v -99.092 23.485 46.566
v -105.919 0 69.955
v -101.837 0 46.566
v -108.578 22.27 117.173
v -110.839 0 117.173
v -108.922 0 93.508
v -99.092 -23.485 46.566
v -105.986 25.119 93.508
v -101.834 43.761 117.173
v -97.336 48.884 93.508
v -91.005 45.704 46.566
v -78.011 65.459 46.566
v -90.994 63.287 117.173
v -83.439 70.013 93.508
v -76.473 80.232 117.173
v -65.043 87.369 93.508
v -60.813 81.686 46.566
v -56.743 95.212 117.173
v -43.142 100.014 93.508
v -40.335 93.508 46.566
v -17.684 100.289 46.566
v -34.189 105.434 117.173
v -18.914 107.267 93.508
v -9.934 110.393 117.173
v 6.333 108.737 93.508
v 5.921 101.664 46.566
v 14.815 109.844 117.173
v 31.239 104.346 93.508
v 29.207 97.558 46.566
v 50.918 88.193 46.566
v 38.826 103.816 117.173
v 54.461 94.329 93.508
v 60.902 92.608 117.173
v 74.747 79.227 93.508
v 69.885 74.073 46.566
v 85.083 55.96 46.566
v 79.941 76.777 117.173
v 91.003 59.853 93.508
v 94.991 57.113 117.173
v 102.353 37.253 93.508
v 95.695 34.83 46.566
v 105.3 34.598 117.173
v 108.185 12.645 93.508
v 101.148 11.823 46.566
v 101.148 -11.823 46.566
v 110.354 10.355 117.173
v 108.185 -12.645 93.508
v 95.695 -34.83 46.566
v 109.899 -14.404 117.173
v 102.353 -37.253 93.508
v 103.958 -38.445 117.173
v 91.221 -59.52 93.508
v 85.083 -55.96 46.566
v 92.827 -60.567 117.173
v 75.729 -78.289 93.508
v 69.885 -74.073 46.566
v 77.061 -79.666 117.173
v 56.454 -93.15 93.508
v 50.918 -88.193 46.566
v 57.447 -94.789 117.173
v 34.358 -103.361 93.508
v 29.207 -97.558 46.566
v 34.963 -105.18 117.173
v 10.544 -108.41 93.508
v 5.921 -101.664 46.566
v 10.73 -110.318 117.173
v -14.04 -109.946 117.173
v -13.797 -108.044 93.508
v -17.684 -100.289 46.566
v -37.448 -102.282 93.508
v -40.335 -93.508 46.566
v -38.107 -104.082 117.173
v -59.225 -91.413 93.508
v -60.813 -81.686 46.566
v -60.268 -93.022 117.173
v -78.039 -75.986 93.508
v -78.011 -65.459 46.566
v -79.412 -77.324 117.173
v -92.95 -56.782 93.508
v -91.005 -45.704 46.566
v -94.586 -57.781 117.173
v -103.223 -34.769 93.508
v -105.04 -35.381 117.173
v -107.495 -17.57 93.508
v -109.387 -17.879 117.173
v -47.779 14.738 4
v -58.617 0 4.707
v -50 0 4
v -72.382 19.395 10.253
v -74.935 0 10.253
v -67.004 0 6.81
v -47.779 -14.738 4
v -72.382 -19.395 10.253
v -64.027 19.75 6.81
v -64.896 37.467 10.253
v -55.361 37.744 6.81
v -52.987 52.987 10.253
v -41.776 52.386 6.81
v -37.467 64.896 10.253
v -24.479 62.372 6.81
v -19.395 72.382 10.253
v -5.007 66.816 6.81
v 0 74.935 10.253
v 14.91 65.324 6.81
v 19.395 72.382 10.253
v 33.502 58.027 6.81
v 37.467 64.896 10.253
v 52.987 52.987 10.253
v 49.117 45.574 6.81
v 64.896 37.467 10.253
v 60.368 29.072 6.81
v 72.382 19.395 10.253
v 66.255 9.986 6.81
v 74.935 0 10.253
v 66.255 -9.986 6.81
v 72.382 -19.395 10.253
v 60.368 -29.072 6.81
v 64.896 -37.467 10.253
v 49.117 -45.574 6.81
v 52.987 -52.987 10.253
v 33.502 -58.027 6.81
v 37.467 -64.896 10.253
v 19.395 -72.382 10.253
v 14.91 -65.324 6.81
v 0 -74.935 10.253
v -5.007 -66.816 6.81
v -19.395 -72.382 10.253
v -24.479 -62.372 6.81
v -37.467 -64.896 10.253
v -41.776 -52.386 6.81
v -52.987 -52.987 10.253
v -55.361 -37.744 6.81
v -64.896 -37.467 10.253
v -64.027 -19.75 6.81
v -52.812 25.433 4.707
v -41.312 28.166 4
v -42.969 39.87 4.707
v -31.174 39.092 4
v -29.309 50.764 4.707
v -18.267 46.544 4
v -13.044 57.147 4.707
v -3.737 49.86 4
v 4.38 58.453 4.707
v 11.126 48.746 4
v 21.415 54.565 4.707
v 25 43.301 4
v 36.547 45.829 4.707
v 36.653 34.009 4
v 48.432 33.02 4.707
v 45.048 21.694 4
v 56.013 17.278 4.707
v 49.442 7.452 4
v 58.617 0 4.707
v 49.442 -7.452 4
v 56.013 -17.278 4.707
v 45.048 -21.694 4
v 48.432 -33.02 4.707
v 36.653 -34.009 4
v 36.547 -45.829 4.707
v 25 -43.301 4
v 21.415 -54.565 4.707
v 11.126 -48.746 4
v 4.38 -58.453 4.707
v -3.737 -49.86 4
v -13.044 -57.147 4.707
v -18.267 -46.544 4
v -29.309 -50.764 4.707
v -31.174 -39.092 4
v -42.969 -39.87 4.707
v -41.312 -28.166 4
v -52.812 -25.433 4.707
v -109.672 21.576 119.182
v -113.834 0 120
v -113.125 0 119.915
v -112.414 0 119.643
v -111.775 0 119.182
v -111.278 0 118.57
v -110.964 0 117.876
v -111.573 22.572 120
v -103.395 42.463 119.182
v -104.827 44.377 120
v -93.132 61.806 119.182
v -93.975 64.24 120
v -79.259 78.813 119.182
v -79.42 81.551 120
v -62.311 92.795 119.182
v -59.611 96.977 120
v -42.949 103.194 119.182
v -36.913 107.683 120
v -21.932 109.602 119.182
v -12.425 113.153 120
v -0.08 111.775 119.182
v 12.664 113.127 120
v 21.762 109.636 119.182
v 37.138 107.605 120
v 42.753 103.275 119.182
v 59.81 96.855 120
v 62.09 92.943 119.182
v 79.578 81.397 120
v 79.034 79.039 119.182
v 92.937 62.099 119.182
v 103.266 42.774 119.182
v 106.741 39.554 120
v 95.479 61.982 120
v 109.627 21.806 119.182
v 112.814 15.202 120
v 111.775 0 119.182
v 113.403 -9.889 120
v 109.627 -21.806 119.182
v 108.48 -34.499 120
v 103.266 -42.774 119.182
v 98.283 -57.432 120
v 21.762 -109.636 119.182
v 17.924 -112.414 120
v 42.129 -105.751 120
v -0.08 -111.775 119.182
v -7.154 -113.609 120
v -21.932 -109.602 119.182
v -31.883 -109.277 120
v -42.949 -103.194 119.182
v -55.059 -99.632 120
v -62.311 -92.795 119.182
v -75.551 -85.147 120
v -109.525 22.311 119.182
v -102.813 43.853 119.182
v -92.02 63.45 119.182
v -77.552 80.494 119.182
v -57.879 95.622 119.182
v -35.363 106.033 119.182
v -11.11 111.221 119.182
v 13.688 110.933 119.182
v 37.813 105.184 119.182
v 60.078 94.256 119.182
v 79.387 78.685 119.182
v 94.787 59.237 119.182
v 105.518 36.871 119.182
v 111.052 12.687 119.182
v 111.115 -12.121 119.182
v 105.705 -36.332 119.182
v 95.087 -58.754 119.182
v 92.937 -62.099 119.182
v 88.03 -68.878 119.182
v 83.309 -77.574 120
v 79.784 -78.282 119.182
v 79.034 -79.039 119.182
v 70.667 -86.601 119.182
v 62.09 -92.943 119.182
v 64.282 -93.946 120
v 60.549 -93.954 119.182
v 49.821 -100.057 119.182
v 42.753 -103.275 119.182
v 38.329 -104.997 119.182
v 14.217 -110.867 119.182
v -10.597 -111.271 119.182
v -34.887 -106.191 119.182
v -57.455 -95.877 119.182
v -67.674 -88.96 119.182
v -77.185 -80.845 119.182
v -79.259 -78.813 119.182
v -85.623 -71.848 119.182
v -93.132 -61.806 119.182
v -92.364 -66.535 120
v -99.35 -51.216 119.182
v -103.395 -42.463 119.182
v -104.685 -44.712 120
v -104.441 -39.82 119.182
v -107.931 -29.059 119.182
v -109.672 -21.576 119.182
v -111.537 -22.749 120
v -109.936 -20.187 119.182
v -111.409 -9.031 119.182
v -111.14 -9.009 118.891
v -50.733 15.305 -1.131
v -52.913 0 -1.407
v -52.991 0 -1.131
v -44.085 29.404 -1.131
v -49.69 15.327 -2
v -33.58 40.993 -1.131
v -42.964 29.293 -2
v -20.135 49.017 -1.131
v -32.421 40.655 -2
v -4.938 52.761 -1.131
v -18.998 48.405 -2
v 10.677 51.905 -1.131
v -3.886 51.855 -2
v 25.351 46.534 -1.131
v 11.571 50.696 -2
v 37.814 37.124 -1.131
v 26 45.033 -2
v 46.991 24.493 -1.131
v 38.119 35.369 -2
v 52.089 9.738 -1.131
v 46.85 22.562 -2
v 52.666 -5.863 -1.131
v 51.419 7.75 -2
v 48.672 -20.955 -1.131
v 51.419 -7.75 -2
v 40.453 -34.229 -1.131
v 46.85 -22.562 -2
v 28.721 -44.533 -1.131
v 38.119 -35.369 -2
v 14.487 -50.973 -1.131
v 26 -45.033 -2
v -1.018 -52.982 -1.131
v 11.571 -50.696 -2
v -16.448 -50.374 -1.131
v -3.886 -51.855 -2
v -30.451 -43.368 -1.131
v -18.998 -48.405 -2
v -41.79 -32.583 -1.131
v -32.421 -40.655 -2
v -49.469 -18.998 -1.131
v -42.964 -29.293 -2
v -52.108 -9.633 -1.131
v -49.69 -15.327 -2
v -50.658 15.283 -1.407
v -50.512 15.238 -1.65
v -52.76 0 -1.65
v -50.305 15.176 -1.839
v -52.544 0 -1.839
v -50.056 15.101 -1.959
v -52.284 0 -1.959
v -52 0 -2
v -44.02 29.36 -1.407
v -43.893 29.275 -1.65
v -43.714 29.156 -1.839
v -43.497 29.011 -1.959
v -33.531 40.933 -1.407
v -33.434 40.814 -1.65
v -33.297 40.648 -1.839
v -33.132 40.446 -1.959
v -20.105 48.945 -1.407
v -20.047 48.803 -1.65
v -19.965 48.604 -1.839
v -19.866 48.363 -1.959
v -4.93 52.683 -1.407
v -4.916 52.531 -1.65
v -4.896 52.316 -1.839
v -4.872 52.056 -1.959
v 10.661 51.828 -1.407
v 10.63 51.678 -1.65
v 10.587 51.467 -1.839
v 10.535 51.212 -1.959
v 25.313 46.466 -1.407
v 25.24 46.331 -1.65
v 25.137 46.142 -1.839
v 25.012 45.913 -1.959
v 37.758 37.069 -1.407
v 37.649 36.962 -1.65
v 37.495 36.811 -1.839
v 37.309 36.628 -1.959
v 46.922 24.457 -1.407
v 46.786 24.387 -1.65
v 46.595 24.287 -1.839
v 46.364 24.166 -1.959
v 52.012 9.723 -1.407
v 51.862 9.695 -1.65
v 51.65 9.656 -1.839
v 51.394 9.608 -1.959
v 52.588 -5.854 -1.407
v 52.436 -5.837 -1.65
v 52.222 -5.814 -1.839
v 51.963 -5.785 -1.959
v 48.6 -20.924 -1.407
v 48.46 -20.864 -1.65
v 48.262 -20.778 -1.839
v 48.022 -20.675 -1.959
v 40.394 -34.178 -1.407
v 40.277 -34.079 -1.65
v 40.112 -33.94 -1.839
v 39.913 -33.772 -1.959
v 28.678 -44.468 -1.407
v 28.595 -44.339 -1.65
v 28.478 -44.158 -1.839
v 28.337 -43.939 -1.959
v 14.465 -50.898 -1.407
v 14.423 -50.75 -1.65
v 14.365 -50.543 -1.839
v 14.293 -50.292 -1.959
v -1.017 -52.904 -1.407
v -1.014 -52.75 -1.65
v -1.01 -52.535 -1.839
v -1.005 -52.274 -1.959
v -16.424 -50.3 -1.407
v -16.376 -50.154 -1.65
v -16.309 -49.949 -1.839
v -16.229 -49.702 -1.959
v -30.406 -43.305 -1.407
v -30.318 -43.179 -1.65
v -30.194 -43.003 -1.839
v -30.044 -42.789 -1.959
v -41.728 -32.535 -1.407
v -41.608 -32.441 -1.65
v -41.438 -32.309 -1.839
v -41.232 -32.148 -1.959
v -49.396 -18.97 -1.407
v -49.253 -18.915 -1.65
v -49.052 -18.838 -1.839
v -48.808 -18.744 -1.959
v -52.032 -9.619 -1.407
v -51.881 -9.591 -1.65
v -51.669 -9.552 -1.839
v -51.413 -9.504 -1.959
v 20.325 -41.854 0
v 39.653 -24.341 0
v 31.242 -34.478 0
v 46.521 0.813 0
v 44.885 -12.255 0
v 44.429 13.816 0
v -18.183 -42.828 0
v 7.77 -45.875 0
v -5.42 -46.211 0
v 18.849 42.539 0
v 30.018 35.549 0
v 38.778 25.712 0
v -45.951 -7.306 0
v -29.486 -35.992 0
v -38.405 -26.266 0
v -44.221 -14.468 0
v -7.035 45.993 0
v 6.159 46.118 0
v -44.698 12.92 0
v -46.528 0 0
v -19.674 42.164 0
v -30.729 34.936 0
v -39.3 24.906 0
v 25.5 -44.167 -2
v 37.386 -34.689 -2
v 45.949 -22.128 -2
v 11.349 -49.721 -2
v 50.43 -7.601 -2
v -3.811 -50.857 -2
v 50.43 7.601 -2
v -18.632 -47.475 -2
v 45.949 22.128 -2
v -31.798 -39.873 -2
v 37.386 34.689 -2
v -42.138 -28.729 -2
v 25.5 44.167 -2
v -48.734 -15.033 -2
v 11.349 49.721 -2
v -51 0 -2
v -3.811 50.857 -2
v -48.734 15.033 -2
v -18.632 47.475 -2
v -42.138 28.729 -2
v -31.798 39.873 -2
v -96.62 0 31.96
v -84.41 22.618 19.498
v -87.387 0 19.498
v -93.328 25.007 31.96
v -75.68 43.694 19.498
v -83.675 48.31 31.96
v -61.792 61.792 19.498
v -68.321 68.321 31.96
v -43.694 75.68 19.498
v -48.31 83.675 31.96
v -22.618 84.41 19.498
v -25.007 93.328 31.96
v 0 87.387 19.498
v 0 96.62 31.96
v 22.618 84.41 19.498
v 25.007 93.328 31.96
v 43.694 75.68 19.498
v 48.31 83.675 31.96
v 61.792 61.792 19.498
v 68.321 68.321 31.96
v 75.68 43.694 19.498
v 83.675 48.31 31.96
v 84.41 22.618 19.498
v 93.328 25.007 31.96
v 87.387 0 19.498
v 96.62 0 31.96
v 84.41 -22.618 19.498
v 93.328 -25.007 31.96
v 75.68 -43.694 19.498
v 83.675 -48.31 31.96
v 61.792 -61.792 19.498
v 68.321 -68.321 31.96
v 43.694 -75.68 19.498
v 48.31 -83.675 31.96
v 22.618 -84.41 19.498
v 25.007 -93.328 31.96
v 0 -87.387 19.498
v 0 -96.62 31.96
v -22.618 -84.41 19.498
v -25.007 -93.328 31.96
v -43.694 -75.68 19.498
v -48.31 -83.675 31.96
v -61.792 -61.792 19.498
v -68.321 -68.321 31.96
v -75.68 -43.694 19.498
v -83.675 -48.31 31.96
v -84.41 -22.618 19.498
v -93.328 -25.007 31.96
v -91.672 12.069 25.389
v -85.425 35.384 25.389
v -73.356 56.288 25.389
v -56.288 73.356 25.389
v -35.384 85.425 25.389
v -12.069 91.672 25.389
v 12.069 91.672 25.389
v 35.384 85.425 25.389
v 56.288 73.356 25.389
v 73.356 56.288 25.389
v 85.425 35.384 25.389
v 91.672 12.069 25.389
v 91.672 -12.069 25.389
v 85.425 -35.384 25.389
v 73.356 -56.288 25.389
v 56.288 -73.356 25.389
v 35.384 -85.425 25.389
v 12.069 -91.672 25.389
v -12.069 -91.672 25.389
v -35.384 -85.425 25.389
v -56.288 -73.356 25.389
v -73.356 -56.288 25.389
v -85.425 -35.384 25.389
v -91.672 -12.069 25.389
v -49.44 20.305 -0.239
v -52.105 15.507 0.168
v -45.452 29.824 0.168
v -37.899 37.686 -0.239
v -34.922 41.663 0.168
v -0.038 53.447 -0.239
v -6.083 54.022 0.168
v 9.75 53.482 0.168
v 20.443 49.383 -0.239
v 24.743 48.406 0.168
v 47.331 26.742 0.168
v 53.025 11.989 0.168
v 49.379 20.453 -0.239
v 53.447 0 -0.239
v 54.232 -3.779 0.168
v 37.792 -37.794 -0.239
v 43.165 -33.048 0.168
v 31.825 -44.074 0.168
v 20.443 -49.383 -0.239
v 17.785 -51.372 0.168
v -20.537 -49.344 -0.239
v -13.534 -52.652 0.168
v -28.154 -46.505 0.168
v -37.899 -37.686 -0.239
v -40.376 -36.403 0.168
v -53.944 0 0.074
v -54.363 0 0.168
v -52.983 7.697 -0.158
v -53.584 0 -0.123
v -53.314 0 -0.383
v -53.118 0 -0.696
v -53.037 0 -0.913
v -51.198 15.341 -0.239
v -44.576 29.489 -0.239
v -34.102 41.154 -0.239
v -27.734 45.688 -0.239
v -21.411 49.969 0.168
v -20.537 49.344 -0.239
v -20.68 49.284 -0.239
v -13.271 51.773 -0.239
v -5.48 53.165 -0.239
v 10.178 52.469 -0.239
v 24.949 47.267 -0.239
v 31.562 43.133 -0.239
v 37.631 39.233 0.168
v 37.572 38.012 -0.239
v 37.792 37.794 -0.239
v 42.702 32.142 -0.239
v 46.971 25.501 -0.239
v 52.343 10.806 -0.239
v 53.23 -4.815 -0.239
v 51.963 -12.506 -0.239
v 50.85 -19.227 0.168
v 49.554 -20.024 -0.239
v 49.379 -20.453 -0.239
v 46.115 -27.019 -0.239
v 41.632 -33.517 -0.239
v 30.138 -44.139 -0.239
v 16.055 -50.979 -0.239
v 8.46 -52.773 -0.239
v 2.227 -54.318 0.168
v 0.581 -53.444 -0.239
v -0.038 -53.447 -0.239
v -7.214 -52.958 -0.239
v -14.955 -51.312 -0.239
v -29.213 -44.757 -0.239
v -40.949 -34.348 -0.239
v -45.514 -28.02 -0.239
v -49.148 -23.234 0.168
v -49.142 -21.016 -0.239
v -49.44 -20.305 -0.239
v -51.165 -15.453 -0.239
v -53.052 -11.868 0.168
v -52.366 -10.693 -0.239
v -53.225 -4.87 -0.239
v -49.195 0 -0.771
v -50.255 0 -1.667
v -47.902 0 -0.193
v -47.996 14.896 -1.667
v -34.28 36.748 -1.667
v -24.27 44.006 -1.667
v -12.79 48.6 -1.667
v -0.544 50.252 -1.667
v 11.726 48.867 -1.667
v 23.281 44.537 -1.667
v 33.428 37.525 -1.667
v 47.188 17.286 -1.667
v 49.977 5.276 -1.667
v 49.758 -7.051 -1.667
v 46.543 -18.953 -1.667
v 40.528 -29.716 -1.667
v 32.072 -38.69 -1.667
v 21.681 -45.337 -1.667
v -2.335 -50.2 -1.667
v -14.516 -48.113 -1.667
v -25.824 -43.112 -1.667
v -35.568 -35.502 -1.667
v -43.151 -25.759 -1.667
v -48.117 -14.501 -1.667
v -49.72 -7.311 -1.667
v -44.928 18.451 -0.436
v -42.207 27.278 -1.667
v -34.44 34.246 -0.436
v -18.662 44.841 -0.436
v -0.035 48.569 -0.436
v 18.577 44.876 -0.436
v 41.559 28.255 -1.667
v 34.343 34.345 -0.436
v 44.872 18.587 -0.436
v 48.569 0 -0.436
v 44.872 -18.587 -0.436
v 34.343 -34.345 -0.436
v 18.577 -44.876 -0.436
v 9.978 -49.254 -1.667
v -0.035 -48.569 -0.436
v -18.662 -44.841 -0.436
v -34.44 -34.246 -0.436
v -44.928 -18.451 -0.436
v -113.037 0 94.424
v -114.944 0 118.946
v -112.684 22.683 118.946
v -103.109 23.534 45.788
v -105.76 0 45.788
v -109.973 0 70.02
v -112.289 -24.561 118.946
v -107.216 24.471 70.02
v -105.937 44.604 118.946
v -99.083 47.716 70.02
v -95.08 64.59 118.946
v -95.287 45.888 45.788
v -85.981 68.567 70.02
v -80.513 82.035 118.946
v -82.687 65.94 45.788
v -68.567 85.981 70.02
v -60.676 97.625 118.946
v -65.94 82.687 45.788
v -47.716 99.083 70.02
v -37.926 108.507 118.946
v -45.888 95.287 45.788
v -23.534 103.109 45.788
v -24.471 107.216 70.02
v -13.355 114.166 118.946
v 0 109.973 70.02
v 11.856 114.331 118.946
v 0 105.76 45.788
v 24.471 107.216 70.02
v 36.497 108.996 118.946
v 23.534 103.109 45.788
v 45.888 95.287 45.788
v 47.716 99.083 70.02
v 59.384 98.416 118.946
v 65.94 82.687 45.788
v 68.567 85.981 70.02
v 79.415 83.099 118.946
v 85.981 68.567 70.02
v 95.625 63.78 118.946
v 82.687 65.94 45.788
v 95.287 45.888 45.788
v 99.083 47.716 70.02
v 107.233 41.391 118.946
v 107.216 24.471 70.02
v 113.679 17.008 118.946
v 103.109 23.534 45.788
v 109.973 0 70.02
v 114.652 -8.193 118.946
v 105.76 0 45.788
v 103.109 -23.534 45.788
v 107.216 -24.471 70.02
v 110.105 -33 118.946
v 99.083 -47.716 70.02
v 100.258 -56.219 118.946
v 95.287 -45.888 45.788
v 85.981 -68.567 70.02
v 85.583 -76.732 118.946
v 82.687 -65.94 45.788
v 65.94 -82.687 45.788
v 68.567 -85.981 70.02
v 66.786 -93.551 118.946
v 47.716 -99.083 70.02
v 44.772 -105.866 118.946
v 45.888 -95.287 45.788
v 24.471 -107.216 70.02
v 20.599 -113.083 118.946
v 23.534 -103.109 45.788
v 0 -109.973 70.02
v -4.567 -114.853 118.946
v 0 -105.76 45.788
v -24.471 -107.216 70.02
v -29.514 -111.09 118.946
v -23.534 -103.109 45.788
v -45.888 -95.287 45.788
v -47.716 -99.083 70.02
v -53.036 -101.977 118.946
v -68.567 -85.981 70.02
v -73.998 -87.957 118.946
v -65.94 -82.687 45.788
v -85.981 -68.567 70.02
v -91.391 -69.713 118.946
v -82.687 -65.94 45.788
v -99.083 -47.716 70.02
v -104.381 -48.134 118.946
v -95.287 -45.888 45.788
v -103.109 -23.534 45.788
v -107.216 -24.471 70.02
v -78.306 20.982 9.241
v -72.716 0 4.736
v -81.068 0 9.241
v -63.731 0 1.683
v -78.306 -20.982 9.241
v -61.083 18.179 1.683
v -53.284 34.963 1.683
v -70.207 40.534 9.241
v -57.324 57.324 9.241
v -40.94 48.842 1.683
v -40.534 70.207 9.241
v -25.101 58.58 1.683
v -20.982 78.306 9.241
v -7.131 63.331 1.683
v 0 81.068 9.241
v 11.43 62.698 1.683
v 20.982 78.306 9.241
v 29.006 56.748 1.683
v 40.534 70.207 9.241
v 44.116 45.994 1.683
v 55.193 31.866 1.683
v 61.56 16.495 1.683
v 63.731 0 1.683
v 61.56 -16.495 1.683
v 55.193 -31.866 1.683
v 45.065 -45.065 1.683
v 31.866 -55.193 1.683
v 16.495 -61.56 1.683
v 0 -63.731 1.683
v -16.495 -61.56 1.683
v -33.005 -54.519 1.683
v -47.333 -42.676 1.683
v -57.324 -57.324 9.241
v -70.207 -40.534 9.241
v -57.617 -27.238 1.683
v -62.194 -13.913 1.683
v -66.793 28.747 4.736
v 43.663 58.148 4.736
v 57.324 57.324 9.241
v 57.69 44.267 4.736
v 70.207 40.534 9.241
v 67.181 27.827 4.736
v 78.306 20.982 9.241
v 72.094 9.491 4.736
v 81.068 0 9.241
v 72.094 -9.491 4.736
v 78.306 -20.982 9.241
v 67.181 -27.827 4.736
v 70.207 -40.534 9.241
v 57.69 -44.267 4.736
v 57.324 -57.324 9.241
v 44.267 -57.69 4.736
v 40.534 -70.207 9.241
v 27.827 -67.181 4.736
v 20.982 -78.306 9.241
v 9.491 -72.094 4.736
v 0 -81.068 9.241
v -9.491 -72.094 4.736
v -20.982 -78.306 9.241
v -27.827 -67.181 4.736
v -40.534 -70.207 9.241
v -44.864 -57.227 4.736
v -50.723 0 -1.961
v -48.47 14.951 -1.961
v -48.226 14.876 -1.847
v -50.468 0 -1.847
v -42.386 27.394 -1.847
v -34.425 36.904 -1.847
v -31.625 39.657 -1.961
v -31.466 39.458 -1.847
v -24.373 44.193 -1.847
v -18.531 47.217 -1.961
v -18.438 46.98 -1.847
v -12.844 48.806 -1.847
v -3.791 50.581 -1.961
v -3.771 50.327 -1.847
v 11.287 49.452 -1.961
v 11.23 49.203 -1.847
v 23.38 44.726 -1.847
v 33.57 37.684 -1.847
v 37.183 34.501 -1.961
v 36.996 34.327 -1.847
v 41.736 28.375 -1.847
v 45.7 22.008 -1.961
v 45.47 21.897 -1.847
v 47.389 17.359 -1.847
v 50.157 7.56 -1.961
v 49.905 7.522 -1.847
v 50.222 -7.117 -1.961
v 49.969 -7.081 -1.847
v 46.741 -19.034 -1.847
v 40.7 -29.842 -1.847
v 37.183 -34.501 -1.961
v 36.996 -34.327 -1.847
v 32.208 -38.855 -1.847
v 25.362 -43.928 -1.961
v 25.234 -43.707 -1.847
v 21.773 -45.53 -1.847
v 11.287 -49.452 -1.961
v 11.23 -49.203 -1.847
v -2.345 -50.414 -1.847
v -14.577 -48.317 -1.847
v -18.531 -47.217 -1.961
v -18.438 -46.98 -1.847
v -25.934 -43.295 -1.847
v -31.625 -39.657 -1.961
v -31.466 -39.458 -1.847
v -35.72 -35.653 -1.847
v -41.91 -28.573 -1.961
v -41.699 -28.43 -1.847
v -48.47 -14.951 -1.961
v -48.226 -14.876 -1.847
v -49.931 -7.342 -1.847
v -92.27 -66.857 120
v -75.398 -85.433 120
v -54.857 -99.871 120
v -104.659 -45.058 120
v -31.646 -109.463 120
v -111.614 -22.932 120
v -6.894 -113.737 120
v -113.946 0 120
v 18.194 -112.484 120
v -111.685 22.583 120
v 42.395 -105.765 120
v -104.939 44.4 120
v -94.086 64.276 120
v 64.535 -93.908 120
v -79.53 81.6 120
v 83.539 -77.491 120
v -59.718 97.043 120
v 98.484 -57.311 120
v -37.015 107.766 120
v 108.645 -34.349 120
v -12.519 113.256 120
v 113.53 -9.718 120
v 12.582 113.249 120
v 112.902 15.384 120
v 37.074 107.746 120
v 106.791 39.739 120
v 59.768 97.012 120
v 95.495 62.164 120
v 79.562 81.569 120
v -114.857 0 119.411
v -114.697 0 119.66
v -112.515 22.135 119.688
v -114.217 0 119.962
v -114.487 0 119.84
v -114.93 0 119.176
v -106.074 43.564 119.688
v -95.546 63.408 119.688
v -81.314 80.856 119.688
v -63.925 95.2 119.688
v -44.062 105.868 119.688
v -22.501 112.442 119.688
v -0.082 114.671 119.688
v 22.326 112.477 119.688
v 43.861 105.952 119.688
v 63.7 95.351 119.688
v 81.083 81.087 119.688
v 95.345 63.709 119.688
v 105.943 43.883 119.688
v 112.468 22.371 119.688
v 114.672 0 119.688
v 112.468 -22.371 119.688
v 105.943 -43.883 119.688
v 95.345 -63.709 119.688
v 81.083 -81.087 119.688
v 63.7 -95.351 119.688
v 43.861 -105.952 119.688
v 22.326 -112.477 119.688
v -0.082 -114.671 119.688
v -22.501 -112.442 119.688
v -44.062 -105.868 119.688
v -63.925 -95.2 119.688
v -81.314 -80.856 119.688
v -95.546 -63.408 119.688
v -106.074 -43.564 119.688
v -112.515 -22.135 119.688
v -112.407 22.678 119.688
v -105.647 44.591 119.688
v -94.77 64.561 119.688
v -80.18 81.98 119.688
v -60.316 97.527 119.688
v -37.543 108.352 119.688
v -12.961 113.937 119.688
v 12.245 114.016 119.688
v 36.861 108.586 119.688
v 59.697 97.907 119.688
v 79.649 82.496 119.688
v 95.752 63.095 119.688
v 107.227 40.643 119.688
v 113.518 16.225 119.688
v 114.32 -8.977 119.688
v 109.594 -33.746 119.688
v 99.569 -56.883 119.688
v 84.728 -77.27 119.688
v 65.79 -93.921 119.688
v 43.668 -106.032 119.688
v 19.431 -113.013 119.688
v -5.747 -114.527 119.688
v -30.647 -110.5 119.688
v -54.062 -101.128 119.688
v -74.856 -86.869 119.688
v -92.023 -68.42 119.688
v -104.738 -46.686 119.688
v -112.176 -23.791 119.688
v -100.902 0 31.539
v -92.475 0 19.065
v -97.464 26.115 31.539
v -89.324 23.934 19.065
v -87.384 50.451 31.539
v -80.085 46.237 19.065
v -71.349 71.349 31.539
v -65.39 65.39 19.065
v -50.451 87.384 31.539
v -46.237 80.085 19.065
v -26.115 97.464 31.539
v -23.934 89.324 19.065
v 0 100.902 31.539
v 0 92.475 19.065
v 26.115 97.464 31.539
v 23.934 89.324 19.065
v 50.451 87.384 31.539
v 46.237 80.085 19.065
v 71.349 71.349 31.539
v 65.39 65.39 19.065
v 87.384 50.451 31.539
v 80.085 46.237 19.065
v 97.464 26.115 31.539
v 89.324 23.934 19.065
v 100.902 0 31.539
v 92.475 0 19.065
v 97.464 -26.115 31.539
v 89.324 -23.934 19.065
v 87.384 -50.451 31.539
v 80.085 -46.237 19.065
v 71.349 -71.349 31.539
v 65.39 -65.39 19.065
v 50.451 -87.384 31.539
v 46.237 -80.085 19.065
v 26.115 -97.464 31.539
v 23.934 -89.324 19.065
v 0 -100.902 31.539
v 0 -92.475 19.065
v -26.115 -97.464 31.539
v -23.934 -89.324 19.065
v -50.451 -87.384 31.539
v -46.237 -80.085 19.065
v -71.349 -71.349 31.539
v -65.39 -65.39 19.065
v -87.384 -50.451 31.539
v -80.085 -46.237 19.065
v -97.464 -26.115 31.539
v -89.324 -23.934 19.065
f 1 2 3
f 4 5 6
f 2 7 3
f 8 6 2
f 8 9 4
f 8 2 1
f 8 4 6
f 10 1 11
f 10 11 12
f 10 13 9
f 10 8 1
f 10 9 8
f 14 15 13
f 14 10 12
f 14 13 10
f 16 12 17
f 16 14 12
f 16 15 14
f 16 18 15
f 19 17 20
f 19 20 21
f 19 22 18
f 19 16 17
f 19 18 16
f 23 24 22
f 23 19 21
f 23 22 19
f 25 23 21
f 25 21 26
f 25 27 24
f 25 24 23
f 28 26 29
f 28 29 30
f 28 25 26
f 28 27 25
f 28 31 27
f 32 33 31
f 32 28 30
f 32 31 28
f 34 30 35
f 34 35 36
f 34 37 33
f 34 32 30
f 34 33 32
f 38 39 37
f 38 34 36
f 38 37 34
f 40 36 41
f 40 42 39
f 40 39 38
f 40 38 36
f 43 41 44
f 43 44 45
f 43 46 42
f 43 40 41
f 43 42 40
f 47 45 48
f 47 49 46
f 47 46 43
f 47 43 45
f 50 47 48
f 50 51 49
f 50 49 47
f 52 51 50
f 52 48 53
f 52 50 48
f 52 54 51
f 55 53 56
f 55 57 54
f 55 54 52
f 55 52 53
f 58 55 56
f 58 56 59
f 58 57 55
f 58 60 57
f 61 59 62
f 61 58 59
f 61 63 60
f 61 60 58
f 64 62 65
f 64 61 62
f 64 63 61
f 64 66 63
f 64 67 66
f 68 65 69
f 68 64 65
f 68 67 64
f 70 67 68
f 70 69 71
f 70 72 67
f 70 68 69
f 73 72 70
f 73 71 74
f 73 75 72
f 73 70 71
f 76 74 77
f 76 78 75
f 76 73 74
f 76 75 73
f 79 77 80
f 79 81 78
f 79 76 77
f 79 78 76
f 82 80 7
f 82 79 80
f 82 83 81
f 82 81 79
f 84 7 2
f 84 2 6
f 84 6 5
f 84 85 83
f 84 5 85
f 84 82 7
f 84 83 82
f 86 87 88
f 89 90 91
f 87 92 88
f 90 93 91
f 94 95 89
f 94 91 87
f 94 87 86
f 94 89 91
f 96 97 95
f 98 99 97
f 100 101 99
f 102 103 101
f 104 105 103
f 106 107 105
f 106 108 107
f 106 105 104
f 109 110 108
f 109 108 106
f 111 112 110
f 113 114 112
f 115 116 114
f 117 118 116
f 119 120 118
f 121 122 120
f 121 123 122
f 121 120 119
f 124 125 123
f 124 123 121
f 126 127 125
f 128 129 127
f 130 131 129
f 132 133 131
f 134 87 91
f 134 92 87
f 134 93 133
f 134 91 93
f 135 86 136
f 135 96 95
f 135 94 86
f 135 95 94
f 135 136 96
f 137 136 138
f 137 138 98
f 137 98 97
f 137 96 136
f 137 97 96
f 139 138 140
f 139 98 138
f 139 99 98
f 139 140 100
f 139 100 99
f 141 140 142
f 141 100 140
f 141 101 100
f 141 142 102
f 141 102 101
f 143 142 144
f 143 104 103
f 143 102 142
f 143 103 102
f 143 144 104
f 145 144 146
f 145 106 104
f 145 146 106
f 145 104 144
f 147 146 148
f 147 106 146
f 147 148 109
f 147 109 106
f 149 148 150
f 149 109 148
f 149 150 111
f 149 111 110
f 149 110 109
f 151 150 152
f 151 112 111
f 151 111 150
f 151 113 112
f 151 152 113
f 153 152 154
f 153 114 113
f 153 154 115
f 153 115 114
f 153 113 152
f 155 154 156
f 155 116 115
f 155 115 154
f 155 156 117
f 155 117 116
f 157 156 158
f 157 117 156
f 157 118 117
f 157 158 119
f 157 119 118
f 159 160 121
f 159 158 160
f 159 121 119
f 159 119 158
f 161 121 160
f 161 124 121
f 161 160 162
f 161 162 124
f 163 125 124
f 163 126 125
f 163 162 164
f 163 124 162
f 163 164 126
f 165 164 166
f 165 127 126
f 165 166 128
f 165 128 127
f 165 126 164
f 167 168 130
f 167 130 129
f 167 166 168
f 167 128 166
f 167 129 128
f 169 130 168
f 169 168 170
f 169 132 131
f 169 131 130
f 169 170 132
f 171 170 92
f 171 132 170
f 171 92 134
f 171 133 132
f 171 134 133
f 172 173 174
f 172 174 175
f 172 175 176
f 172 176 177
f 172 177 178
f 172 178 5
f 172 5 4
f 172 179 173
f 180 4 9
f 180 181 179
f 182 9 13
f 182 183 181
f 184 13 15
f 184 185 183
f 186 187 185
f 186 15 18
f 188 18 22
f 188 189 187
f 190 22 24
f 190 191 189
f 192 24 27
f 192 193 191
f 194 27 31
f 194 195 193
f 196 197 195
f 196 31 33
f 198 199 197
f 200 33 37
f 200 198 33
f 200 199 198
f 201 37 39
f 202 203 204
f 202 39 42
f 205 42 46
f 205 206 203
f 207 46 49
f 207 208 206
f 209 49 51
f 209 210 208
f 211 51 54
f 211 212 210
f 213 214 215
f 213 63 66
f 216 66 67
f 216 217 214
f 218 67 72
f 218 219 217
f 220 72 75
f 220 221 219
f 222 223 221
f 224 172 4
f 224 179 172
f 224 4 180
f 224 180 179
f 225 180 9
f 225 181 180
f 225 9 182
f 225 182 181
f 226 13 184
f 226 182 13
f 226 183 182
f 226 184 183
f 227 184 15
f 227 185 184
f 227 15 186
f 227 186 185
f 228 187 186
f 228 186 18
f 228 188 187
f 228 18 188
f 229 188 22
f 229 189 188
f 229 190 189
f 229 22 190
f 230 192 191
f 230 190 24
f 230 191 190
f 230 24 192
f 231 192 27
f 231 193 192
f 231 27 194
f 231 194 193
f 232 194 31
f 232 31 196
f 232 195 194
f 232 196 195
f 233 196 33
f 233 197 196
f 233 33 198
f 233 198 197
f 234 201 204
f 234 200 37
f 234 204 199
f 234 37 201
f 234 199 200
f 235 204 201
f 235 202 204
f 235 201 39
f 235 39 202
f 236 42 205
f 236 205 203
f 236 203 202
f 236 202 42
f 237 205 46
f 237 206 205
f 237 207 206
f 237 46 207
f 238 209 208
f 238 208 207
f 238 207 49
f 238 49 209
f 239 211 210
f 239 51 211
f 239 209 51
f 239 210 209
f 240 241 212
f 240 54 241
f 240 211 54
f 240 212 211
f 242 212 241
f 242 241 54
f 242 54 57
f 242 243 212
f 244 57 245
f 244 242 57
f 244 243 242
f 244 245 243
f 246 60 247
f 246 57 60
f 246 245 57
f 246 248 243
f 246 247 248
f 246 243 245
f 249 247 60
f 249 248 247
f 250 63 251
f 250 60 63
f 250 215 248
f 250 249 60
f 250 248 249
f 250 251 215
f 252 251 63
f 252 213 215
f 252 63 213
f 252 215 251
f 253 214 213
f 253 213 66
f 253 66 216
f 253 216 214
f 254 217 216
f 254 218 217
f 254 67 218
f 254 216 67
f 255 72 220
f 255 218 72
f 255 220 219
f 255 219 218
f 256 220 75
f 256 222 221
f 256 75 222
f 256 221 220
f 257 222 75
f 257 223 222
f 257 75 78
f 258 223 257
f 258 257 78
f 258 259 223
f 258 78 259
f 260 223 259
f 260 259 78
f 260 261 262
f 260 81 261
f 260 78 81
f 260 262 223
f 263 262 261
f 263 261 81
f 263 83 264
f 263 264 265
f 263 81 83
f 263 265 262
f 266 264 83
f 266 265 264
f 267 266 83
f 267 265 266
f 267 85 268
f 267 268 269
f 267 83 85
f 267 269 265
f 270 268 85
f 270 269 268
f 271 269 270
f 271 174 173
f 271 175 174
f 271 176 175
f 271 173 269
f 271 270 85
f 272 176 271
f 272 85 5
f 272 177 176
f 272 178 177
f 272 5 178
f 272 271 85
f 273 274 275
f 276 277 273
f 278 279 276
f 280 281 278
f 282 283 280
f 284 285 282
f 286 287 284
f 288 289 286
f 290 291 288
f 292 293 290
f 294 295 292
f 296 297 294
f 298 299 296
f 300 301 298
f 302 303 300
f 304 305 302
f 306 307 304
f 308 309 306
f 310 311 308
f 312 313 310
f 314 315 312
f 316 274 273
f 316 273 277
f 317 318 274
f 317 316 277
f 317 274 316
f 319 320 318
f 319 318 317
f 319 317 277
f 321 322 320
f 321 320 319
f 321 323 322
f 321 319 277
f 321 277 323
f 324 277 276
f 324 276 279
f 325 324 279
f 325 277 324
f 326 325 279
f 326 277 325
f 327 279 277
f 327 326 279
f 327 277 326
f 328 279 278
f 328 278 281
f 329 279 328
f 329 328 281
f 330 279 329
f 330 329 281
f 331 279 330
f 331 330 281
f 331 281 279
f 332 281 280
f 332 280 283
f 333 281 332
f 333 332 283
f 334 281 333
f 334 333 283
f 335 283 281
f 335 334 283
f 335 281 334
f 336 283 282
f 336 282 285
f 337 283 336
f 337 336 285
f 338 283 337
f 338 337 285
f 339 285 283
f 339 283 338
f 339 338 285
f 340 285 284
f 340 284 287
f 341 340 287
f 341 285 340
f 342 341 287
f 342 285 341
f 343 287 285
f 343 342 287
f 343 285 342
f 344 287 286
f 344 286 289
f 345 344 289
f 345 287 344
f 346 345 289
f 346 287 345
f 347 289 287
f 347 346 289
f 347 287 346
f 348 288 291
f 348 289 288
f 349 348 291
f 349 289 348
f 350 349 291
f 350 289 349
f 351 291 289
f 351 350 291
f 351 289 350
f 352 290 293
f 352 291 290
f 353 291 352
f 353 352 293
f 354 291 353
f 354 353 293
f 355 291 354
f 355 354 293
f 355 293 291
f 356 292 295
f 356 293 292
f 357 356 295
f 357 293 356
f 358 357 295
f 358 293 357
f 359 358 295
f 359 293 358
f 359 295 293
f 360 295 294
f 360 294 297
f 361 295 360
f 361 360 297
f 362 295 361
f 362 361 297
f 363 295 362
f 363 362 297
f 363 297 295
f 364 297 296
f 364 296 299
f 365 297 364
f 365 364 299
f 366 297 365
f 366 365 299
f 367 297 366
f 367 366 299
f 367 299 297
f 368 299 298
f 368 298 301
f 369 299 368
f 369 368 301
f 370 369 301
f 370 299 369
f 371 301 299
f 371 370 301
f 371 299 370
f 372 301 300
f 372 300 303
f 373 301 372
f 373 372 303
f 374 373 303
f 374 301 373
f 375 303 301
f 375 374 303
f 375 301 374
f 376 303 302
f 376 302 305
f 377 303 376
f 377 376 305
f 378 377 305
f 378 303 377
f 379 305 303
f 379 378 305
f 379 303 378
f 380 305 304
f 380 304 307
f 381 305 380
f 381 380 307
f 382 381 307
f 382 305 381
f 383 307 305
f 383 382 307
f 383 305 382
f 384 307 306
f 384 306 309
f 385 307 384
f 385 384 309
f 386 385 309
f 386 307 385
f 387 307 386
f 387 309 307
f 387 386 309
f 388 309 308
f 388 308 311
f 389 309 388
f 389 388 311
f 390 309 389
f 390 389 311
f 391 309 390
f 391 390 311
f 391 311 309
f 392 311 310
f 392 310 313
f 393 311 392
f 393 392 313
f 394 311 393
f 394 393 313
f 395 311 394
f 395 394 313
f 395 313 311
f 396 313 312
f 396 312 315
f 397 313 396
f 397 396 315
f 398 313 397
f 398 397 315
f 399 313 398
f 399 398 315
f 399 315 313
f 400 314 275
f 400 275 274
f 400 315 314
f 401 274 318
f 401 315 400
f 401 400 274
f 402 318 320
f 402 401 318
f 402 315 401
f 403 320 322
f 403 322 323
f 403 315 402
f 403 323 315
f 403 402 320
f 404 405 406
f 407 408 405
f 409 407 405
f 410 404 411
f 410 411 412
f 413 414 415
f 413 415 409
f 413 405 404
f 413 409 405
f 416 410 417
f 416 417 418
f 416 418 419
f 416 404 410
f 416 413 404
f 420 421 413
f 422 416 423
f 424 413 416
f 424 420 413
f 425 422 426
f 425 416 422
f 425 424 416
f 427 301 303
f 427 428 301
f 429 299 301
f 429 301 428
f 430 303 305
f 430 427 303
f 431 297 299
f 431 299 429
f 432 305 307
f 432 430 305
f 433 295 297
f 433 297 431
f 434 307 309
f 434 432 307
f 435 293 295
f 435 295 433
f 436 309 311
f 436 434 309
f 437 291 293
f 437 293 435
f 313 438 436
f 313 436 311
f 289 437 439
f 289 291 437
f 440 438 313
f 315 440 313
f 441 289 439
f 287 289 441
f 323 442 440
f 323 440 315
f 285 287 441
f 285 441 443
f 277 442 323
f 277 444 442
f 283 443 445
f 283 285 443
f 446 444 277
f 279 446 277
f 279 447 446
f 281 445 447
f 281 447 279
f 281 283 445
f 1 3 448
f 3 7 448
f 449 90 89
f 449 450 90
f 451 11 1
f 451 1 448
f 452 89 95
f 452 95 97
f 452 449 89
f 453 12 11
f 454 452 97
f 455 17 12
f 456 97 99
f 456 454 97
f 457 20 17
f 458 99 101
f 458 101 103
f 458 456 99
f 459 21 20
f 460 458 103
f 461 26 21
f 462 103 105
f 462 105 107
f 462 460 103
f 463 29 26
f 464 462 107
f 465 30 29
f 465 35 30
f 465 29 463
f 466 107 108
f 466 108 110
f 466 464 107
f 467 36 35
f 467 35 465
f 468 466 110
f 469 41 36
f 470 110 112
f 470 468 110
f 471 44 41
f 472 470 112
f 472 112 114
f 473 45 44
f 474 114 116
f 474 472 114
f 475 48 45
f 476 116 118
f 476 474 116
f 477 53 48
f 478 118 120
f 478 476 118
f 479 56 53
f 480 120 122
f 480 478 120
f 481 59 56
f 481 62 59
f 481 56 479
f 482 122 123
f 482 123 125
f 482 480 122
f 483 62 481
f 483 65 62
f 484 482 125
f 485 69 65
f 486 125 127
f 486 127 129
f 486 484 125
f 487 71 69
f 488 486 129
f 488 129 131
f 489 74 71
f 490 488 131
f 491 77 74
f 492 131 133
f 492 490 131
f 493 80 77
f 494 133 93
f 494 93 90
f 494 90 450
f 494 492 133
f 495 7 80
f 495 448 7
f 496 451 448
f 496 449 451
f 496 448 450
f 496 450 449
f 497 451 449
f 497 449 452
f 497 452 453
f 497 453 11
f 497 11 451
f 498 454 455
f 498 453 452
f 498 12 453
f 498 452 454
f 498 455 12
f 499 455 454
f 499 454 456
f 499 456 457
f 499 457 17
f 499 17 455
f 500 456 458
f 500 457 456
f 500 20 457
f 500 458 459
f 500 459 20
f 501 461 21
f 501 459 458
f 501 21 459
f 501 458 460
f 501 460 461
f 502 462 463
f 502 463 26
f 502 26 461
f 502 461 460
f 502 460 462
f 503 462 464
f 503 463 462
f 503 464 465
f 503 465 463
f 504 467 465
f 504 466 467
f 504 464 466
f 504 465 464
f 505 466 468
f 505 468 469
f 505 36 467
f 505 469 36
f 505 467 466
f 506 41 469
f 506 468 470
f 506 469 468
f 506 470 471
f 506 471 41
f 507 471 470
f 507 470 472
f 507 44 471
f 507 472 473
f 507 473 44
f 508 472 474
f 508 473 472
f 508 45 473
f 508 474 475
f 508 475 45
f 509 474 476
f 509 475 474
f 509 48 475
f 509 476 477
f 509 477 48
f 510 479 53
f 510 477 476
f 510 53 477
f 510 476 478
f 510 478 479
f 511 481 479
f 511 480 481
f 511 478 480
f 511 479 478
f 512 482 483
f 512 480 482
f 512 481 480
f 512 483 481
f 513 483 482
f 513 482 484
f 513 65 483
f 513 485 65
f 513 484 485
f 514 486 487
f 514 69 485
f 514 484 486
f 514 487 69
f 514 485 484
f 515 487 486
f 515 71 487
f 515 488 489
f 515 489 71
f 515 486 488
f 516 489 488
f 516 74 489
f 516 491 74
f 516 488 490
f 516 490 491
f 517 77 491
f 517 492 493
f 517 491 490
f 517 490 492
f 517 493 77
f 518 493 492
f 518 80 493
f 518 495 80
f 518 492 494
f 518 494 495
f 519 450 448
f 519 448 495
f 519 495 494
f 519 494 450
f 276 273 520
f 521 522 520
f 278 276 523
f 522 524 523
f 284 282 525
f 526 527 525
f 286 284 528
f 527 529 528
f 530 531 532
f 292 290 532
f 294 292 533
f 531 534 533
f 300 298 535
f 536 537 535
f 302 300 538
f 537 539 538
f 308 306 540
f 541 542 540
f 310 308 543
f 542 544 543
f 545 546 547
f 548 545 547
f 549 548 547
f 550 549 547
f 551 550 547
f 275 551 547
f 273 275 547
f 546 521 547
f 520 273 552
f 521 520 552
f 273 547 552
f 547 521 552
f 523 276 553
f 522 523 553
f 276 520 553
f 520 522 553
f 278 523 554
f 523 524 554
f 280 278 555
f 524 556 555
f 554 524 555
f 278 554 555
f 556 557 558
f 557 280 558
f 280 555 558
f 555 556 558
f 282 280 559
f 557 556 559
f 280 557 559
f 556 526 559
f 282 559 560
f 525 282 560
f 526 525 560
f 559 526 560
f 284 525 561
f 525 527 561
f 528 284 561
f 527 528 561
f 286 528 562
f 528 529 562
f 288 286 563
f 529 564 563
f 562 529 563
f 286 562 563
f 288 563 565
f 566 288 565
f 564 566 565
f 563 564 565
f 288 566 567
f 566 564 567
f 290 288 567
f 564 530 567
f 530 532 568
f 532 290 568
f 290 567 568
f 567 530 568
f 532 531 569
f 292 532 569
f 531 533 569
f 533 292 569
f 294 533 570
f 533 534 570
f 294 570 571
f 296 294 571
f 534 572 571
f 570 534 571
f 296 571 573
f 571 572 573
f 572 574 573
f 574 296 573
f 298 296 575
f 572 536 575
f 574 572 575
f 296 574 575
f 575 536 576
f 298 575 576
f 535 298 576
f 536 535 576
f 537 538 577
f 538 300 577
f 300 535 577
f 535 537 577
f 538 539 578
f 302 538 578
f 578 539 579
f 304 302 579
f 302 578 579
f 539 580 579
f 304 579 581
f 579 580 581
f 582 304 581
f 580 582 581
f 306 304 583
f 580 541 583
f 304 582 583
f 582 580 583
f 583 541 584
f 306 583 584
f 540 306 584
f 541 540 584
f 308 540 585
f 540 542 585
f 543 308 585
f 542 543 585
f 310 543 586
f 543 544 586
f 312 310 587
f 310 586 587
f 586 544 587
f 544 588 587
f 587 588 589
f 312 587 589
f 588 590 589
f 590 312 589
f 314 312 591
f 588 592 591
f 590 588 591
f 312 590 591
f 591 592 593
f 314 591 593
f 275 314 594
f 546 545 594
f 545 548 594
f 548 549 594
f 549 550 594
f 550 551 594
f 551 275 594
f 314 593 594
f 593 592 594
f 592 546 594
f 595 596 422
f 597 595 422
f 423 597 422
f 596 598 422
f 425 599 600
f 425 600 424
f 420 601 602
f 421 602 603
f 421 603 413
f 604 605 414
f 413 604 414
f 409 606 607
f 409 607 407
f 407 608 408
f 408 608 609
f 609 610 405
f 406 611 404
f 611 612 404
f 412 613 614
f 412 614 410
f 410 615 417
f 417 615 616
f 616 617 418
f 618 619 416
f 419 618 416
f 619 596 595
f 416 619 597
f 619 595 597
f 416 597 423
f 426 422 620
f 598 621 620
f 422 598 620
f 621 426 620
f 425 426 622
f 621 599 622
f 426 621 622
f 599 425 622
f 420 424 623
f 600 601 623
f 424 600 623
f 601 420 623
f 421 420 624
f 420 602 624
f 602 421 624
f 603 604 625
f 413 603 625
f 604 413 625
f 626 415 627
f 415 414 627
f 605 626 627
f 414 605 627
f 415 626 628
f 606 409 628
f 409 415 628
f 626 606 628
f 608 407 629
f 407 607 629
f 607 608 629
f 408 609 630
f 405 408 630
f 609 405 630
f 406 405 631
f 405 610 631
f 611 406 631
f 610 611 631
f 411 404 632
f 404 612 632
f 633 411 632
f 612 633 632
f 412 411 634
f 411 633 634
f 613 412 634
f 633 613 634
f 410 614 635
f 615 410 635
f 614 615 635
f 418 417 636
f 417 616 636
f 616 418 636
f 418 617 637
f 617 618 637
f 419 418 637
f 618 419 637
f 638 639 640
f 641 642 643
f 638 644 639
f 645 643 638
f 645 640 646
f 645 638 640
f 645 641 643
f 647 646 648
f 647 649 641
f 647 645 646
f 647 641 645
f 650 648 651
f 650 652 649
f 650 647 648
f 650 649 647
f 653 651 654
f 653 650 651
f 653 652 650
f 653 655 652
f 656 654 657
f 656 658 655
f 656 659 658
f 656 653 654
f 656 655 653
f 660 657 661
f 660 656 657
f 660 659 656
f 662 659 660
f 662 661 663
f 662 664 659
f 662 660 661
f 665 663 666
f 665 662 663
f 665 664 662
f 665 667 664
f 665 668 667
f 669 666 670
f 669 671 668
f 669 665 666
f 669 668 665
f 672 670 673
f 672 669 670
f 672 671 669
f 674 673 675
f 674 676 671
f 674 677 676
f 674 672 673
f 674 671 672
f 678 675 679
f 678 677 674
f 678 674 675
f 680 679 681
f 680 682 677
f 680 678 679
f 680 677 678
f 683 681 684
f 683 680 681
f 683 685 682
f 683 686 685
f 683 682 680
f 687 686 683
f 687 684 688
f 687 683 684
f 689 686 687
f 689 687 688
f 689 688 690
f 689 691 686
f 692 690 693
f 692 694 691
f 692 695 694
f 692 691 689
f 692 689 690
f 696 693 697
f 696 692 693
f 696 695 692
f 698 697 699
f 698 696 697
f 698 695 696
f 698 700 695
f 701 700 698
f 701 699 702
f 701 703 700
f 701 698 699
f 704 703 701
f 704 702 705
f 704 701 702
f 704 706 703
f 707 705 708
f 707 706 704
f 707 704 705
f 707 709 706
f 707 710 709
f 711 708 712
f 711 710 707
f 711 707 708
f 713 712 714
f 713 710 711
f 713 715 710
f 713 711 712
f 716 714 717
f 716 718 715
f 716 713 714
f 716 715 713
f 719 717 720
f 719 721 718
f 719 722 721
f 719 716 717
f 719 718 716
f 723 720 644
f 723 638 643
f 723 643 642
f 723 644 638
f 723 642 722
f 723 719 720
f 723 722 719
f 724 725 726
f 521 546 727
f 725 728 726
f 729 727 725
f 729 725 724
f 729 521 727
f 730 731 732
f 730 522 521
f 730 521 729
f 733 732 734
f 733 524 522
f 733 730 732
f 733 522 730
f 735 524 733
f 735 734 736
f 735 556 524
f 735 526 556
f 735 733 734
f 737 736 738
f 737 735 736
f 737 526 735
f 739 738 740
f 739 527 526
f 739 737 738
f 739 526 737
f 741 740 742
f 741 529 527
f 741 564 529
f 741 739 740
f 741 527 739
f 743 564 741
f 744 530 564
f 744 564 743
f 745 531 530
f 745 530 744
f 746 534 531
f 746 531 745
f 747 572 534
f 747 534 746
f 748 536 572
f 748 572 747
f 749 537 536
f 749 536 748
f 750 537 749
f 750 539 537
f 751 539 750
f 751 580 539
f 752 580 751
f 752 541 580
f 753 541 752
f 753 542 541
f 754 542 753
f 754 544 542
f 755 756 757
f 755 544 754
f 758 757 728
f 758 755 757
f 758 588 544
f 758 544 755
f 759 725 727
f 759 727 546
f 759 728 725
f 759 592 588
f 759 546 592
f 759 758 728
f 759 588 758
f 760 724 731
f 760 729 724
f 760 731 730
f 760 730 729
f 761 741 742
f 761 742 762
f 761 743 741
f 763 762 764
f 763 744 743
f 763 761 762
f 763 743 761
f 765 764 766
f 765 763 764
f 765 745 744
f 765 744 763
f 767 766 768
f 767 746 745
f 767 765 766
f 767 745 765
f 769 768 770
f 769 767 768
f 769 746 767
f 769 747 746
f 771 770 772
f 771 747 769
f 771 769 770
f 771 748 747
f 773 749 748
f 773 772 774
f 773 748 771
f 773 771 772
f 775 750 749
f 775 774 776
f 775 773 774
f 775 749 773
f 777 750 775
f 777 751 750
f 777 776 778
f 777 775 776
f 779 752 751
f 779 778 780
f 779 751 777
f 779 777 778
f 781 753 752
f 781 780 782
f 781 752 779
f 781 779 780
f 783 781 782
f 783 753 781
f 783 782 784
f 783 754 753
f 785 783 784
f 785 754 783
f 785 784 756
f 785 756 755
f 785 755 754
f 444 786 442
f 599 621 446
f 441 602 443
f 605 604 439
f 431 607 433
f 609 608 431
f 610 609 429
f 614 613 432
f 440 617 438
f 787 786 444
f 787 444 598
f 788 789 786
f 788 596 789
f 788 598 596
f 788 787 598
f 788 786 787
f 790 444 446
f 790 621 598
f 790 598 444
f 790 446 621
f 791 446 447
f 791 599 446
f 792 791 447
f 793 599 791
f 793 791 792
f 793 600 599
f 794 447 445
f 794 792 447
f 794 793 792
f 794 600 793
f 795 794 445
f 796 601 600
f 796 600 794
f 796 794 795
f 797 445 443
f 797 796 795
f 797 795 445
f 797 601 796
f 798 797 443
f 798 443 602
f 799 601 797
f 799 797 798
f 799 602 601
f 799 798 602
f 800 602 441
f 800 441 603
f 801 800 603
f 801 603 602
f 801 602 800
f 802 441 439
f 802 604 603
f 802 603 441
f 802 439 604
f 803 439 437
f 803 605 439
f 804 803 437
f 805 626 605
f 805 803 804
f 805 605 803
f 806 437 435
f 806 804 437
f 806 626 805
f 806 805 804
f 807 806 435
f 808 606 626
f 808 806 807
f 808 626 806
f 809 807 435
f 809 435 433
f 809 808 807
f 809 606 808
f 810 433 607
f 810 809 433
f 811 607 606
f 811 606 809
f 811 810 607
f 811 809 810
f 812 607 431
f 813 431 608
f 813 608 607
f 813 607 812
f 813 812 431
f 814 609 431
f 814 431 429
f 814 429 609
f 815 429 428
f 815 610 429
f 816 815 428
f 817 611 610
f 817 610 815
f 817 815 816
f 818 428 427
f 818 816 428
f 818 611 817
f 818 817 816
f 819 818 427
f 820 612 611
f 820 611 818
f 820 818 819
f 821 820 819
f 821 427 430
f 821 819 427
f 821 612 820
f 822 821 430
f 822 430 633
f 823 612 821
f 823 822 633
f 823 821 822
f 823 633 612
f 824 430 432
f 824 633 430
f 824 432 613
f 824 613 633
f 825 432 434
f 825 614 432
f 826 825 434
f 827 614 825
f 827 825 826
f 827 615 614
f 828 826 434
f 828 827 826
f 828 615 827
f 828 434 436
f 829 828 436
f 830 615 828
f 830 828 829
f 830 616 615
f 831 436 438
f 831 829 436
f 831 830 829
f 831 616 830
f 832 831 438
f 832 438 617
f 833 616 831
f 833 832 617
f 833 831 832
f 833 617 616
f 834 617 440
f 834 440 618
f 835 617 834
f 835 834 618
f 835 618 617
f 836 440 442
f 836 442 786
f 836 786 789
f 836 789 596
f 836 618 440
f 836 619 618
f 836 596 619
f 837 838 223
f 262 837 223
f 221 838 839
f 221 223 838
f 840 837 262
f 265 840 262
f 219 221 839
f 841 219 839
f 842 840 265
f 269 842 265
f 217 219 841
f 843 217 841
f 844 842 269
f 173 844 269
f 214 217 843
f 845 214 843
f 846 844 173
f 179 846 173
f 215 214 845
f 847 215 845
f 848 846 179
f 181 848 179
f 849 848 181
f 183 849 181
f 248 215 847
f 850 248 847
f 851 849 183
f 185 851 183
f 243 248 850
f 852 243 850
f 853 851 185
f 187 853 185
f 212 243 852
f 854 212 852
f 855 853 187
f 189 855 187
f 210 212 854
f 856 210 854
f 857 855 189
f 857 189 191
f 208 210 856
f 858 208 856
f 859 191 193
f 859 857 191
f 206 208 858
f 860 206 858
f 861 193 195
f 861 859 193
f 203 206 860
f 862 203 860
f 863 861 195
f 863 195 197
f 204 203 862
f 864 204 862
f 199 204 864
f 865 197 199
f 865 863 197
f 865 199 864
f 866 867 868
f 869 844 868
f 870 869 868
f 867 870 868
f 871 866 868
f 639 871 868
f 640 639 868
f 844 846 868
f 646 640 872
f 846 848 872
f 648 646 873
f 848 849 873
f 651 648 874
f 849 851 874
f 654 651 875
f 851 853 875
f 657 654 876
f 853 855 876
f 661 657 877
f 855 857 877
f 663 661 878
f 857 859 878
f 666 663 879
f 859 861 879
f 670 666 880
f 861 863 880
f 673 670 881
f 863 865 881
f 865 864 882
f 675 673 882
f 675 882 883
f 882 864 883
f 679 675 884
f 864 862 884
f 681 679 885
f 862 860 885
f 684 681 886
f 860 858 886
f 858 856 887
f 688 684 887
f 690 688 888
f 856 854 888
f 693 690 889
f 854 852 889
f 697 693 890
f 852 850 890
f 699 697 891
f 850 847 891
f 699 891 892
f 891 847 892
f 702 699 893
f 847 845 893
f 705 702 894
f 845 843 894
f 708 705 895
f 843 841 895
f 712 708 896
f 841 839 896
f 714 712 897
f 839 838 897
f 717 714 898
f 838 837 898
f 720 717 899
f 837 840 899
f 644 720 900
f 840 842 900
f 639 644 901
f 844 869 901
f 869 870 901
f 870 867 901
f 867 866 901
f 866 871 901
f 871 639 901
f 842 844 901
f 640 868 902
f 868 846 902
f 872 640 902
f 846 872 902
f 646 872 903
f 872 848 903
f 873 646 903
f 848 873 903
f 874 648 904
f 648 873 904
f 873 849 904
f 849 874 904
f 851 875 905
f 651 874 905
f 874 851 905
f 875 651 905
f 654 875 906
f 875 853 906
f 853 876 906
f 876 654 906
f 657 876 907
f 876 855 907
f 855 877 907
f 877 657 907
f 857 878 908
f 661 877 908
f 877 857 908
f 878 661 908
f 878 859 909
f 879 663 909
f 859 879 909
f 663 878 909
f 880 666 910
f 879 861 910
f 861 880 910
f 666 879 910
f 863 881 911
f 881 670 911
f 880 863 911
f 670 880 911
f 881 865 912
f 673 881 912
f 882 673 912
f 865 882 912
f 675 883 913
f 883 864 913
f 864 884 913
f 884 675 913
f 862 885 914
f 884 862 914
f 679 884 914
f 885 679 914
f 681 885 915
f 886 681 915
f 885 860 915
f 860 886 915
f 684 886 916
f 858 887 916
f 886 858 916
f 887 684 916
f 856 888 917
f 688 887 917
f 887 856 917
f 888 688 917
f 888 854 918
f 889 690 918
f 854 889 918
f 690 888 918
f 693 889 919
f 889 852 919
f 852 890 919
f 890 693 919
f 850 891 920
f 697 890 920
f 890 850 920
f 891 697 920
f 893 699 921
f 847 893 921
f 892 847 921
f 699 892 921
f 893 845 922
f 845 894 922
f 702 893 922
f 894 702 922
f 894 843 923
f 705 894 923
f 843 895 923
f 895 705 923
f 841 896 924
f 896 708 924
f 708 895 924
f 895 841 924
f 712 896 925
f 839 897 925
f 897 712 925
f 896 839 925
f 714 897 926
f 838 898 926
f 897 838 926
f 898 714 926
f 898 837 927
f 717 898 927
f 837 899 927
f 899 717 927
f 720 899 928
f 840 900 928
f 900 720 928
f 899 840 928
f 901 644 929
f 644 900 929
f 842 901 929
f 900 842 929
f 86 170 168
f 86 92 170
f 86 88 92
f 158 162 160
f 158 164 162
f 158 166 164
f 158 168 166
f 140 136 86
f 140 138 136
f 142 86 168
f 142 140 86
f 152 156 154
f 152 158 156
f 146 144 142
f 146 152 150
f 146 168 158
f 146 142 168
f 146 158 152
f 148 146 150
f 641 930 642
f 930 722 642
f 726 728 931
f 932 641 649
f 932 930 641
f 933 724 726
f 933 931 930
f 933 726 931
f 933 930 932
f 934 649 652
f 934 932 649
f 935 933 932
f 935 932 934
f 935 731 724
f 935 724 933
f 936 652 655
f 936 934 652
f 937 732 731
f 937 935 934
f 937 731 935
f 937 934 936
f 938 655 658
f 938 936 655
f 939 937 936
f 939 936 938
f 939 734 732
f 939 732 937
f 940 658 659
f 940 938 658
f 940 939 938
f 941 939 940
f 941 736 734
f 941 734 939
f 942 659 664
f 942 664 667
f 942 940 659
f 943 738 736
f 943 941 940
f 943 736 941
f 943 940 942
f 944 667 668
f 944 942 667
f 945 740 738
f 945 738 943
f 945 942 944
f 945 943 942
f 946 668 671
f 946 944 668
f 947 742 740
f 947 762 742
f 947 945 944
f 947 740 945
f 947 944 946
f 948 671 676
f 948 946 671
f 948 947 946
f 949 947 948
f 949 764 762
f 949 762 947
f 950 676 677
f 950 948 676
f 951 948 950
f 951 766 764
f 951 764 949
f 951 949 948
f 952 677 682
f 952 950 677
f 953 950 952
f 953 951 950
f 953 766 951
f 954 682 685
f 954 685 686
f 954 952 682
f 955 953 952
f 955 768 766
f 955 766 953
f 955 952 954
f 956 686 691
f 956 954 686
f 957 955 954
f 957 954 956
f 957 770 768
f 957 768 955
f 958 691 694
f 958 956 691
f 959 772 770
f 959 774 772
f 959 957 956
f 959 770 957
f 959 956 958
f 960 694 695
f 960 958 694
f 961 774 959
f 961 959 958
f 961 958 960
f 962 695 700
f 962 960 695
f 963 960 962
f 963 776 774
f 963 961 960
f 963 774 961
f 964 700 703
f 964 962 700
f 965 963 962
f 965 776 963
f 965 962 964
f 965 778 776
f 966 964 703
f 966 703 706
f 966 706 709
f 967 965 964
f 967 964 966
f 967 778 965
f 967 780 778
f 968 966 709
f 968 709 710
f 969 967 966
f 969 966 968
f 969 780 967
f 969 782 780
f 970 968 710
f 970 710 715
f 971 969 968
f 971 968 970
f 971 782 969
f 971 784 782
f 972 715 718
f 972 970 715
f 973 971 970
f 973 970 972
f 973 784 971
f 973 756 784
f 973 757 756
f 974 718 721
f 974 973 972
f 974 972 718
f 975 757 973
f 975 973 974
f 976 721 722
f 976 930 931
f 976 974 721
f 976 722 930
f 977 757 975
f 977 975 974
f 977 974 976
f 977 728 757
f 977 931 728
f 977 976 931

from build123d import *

# Parameters (mm, degrees)
F2_R = 1
F3_R = 1.5
F4_R = 5
F5_R = 3


with BuildPart() as f1:
    # F0 (on Front) → F1 (revolve)
    with BuildSketch(Plane.XZ):
        with BuildLine():
            Line((-50, 0), (0, 0))
            Line((0, 0), (0, 4))
            Line((0, 4), (-50, 4))
            ThreePointArc((-50, 4), (-62.853434, 5.586957), (-74.934897, 10.252518))
            ThreePointArc((-74.934897, 10.252518), (-92.463312, 25.388512), (-101.83661, 46.565976))
            ThreePointArc((-101.83661, 46.565976), (-107.732623, 83.11874), (-110.994553, 120))
            Line((-110.994553, 120), (-115, 120))
            ThreePointArc((-115, 120), (-111.714837, 82.727745), (-105.760196, 45.787854))
            ThreePointArc((-105.760196, 45.787854), (-97.103281, 25.022165), (-81.068456, 9.241151))
            ThreePointArc((-81.068456, 9.241151), (-67.63945, 2.80603), (-53, 0.079216))
            ThreePointArc((-53, 0.079216), (-51.500523, 0.019808), (-50, 0))
        make_face()
        with BuildLine():
            Line((-50, -2), (-50, 0))
            ThreePointArc((-50, 0), (-51.500523, 0.019808), (-53, 0.079216))
            Line((-53, 0.079216), (-53, -2))
            Line((-53, -2), (-50, -2))
        make_face()
    revolve(axis=Axis((0, 0, 2), (0, 0, -1)))

    # F2
    f2_edges = [f1.edges().sort_by_distance(p)[0] for p in [
        (53, 0, -2),
        (50, 0, -2),
        (115, 0, 120),
    ]]
    fillet(f2_edges, radius=F2_R)

    # F3
    f3_edges = [f1.edges().sort_by_distance(p)[0] for p in [
        (53, 0, 0.079216),
    ]]
    fillet(f3_edges, radius=F3_R)

    # F4
    f4_edges = [f1.edges().sort_by_distance(p)[0] for p in [
        (50, 0, 0),
    ]]
    fillet(f4_edges, radius=F4_R)

    # F5
    f5_edges = [f1.edges().sort_by_distance(p)[0] for p in [
        (110.994553, 0, 120),
    ]]
    fillet(f5_edges, radius=F5_R)


solid = f1.part
